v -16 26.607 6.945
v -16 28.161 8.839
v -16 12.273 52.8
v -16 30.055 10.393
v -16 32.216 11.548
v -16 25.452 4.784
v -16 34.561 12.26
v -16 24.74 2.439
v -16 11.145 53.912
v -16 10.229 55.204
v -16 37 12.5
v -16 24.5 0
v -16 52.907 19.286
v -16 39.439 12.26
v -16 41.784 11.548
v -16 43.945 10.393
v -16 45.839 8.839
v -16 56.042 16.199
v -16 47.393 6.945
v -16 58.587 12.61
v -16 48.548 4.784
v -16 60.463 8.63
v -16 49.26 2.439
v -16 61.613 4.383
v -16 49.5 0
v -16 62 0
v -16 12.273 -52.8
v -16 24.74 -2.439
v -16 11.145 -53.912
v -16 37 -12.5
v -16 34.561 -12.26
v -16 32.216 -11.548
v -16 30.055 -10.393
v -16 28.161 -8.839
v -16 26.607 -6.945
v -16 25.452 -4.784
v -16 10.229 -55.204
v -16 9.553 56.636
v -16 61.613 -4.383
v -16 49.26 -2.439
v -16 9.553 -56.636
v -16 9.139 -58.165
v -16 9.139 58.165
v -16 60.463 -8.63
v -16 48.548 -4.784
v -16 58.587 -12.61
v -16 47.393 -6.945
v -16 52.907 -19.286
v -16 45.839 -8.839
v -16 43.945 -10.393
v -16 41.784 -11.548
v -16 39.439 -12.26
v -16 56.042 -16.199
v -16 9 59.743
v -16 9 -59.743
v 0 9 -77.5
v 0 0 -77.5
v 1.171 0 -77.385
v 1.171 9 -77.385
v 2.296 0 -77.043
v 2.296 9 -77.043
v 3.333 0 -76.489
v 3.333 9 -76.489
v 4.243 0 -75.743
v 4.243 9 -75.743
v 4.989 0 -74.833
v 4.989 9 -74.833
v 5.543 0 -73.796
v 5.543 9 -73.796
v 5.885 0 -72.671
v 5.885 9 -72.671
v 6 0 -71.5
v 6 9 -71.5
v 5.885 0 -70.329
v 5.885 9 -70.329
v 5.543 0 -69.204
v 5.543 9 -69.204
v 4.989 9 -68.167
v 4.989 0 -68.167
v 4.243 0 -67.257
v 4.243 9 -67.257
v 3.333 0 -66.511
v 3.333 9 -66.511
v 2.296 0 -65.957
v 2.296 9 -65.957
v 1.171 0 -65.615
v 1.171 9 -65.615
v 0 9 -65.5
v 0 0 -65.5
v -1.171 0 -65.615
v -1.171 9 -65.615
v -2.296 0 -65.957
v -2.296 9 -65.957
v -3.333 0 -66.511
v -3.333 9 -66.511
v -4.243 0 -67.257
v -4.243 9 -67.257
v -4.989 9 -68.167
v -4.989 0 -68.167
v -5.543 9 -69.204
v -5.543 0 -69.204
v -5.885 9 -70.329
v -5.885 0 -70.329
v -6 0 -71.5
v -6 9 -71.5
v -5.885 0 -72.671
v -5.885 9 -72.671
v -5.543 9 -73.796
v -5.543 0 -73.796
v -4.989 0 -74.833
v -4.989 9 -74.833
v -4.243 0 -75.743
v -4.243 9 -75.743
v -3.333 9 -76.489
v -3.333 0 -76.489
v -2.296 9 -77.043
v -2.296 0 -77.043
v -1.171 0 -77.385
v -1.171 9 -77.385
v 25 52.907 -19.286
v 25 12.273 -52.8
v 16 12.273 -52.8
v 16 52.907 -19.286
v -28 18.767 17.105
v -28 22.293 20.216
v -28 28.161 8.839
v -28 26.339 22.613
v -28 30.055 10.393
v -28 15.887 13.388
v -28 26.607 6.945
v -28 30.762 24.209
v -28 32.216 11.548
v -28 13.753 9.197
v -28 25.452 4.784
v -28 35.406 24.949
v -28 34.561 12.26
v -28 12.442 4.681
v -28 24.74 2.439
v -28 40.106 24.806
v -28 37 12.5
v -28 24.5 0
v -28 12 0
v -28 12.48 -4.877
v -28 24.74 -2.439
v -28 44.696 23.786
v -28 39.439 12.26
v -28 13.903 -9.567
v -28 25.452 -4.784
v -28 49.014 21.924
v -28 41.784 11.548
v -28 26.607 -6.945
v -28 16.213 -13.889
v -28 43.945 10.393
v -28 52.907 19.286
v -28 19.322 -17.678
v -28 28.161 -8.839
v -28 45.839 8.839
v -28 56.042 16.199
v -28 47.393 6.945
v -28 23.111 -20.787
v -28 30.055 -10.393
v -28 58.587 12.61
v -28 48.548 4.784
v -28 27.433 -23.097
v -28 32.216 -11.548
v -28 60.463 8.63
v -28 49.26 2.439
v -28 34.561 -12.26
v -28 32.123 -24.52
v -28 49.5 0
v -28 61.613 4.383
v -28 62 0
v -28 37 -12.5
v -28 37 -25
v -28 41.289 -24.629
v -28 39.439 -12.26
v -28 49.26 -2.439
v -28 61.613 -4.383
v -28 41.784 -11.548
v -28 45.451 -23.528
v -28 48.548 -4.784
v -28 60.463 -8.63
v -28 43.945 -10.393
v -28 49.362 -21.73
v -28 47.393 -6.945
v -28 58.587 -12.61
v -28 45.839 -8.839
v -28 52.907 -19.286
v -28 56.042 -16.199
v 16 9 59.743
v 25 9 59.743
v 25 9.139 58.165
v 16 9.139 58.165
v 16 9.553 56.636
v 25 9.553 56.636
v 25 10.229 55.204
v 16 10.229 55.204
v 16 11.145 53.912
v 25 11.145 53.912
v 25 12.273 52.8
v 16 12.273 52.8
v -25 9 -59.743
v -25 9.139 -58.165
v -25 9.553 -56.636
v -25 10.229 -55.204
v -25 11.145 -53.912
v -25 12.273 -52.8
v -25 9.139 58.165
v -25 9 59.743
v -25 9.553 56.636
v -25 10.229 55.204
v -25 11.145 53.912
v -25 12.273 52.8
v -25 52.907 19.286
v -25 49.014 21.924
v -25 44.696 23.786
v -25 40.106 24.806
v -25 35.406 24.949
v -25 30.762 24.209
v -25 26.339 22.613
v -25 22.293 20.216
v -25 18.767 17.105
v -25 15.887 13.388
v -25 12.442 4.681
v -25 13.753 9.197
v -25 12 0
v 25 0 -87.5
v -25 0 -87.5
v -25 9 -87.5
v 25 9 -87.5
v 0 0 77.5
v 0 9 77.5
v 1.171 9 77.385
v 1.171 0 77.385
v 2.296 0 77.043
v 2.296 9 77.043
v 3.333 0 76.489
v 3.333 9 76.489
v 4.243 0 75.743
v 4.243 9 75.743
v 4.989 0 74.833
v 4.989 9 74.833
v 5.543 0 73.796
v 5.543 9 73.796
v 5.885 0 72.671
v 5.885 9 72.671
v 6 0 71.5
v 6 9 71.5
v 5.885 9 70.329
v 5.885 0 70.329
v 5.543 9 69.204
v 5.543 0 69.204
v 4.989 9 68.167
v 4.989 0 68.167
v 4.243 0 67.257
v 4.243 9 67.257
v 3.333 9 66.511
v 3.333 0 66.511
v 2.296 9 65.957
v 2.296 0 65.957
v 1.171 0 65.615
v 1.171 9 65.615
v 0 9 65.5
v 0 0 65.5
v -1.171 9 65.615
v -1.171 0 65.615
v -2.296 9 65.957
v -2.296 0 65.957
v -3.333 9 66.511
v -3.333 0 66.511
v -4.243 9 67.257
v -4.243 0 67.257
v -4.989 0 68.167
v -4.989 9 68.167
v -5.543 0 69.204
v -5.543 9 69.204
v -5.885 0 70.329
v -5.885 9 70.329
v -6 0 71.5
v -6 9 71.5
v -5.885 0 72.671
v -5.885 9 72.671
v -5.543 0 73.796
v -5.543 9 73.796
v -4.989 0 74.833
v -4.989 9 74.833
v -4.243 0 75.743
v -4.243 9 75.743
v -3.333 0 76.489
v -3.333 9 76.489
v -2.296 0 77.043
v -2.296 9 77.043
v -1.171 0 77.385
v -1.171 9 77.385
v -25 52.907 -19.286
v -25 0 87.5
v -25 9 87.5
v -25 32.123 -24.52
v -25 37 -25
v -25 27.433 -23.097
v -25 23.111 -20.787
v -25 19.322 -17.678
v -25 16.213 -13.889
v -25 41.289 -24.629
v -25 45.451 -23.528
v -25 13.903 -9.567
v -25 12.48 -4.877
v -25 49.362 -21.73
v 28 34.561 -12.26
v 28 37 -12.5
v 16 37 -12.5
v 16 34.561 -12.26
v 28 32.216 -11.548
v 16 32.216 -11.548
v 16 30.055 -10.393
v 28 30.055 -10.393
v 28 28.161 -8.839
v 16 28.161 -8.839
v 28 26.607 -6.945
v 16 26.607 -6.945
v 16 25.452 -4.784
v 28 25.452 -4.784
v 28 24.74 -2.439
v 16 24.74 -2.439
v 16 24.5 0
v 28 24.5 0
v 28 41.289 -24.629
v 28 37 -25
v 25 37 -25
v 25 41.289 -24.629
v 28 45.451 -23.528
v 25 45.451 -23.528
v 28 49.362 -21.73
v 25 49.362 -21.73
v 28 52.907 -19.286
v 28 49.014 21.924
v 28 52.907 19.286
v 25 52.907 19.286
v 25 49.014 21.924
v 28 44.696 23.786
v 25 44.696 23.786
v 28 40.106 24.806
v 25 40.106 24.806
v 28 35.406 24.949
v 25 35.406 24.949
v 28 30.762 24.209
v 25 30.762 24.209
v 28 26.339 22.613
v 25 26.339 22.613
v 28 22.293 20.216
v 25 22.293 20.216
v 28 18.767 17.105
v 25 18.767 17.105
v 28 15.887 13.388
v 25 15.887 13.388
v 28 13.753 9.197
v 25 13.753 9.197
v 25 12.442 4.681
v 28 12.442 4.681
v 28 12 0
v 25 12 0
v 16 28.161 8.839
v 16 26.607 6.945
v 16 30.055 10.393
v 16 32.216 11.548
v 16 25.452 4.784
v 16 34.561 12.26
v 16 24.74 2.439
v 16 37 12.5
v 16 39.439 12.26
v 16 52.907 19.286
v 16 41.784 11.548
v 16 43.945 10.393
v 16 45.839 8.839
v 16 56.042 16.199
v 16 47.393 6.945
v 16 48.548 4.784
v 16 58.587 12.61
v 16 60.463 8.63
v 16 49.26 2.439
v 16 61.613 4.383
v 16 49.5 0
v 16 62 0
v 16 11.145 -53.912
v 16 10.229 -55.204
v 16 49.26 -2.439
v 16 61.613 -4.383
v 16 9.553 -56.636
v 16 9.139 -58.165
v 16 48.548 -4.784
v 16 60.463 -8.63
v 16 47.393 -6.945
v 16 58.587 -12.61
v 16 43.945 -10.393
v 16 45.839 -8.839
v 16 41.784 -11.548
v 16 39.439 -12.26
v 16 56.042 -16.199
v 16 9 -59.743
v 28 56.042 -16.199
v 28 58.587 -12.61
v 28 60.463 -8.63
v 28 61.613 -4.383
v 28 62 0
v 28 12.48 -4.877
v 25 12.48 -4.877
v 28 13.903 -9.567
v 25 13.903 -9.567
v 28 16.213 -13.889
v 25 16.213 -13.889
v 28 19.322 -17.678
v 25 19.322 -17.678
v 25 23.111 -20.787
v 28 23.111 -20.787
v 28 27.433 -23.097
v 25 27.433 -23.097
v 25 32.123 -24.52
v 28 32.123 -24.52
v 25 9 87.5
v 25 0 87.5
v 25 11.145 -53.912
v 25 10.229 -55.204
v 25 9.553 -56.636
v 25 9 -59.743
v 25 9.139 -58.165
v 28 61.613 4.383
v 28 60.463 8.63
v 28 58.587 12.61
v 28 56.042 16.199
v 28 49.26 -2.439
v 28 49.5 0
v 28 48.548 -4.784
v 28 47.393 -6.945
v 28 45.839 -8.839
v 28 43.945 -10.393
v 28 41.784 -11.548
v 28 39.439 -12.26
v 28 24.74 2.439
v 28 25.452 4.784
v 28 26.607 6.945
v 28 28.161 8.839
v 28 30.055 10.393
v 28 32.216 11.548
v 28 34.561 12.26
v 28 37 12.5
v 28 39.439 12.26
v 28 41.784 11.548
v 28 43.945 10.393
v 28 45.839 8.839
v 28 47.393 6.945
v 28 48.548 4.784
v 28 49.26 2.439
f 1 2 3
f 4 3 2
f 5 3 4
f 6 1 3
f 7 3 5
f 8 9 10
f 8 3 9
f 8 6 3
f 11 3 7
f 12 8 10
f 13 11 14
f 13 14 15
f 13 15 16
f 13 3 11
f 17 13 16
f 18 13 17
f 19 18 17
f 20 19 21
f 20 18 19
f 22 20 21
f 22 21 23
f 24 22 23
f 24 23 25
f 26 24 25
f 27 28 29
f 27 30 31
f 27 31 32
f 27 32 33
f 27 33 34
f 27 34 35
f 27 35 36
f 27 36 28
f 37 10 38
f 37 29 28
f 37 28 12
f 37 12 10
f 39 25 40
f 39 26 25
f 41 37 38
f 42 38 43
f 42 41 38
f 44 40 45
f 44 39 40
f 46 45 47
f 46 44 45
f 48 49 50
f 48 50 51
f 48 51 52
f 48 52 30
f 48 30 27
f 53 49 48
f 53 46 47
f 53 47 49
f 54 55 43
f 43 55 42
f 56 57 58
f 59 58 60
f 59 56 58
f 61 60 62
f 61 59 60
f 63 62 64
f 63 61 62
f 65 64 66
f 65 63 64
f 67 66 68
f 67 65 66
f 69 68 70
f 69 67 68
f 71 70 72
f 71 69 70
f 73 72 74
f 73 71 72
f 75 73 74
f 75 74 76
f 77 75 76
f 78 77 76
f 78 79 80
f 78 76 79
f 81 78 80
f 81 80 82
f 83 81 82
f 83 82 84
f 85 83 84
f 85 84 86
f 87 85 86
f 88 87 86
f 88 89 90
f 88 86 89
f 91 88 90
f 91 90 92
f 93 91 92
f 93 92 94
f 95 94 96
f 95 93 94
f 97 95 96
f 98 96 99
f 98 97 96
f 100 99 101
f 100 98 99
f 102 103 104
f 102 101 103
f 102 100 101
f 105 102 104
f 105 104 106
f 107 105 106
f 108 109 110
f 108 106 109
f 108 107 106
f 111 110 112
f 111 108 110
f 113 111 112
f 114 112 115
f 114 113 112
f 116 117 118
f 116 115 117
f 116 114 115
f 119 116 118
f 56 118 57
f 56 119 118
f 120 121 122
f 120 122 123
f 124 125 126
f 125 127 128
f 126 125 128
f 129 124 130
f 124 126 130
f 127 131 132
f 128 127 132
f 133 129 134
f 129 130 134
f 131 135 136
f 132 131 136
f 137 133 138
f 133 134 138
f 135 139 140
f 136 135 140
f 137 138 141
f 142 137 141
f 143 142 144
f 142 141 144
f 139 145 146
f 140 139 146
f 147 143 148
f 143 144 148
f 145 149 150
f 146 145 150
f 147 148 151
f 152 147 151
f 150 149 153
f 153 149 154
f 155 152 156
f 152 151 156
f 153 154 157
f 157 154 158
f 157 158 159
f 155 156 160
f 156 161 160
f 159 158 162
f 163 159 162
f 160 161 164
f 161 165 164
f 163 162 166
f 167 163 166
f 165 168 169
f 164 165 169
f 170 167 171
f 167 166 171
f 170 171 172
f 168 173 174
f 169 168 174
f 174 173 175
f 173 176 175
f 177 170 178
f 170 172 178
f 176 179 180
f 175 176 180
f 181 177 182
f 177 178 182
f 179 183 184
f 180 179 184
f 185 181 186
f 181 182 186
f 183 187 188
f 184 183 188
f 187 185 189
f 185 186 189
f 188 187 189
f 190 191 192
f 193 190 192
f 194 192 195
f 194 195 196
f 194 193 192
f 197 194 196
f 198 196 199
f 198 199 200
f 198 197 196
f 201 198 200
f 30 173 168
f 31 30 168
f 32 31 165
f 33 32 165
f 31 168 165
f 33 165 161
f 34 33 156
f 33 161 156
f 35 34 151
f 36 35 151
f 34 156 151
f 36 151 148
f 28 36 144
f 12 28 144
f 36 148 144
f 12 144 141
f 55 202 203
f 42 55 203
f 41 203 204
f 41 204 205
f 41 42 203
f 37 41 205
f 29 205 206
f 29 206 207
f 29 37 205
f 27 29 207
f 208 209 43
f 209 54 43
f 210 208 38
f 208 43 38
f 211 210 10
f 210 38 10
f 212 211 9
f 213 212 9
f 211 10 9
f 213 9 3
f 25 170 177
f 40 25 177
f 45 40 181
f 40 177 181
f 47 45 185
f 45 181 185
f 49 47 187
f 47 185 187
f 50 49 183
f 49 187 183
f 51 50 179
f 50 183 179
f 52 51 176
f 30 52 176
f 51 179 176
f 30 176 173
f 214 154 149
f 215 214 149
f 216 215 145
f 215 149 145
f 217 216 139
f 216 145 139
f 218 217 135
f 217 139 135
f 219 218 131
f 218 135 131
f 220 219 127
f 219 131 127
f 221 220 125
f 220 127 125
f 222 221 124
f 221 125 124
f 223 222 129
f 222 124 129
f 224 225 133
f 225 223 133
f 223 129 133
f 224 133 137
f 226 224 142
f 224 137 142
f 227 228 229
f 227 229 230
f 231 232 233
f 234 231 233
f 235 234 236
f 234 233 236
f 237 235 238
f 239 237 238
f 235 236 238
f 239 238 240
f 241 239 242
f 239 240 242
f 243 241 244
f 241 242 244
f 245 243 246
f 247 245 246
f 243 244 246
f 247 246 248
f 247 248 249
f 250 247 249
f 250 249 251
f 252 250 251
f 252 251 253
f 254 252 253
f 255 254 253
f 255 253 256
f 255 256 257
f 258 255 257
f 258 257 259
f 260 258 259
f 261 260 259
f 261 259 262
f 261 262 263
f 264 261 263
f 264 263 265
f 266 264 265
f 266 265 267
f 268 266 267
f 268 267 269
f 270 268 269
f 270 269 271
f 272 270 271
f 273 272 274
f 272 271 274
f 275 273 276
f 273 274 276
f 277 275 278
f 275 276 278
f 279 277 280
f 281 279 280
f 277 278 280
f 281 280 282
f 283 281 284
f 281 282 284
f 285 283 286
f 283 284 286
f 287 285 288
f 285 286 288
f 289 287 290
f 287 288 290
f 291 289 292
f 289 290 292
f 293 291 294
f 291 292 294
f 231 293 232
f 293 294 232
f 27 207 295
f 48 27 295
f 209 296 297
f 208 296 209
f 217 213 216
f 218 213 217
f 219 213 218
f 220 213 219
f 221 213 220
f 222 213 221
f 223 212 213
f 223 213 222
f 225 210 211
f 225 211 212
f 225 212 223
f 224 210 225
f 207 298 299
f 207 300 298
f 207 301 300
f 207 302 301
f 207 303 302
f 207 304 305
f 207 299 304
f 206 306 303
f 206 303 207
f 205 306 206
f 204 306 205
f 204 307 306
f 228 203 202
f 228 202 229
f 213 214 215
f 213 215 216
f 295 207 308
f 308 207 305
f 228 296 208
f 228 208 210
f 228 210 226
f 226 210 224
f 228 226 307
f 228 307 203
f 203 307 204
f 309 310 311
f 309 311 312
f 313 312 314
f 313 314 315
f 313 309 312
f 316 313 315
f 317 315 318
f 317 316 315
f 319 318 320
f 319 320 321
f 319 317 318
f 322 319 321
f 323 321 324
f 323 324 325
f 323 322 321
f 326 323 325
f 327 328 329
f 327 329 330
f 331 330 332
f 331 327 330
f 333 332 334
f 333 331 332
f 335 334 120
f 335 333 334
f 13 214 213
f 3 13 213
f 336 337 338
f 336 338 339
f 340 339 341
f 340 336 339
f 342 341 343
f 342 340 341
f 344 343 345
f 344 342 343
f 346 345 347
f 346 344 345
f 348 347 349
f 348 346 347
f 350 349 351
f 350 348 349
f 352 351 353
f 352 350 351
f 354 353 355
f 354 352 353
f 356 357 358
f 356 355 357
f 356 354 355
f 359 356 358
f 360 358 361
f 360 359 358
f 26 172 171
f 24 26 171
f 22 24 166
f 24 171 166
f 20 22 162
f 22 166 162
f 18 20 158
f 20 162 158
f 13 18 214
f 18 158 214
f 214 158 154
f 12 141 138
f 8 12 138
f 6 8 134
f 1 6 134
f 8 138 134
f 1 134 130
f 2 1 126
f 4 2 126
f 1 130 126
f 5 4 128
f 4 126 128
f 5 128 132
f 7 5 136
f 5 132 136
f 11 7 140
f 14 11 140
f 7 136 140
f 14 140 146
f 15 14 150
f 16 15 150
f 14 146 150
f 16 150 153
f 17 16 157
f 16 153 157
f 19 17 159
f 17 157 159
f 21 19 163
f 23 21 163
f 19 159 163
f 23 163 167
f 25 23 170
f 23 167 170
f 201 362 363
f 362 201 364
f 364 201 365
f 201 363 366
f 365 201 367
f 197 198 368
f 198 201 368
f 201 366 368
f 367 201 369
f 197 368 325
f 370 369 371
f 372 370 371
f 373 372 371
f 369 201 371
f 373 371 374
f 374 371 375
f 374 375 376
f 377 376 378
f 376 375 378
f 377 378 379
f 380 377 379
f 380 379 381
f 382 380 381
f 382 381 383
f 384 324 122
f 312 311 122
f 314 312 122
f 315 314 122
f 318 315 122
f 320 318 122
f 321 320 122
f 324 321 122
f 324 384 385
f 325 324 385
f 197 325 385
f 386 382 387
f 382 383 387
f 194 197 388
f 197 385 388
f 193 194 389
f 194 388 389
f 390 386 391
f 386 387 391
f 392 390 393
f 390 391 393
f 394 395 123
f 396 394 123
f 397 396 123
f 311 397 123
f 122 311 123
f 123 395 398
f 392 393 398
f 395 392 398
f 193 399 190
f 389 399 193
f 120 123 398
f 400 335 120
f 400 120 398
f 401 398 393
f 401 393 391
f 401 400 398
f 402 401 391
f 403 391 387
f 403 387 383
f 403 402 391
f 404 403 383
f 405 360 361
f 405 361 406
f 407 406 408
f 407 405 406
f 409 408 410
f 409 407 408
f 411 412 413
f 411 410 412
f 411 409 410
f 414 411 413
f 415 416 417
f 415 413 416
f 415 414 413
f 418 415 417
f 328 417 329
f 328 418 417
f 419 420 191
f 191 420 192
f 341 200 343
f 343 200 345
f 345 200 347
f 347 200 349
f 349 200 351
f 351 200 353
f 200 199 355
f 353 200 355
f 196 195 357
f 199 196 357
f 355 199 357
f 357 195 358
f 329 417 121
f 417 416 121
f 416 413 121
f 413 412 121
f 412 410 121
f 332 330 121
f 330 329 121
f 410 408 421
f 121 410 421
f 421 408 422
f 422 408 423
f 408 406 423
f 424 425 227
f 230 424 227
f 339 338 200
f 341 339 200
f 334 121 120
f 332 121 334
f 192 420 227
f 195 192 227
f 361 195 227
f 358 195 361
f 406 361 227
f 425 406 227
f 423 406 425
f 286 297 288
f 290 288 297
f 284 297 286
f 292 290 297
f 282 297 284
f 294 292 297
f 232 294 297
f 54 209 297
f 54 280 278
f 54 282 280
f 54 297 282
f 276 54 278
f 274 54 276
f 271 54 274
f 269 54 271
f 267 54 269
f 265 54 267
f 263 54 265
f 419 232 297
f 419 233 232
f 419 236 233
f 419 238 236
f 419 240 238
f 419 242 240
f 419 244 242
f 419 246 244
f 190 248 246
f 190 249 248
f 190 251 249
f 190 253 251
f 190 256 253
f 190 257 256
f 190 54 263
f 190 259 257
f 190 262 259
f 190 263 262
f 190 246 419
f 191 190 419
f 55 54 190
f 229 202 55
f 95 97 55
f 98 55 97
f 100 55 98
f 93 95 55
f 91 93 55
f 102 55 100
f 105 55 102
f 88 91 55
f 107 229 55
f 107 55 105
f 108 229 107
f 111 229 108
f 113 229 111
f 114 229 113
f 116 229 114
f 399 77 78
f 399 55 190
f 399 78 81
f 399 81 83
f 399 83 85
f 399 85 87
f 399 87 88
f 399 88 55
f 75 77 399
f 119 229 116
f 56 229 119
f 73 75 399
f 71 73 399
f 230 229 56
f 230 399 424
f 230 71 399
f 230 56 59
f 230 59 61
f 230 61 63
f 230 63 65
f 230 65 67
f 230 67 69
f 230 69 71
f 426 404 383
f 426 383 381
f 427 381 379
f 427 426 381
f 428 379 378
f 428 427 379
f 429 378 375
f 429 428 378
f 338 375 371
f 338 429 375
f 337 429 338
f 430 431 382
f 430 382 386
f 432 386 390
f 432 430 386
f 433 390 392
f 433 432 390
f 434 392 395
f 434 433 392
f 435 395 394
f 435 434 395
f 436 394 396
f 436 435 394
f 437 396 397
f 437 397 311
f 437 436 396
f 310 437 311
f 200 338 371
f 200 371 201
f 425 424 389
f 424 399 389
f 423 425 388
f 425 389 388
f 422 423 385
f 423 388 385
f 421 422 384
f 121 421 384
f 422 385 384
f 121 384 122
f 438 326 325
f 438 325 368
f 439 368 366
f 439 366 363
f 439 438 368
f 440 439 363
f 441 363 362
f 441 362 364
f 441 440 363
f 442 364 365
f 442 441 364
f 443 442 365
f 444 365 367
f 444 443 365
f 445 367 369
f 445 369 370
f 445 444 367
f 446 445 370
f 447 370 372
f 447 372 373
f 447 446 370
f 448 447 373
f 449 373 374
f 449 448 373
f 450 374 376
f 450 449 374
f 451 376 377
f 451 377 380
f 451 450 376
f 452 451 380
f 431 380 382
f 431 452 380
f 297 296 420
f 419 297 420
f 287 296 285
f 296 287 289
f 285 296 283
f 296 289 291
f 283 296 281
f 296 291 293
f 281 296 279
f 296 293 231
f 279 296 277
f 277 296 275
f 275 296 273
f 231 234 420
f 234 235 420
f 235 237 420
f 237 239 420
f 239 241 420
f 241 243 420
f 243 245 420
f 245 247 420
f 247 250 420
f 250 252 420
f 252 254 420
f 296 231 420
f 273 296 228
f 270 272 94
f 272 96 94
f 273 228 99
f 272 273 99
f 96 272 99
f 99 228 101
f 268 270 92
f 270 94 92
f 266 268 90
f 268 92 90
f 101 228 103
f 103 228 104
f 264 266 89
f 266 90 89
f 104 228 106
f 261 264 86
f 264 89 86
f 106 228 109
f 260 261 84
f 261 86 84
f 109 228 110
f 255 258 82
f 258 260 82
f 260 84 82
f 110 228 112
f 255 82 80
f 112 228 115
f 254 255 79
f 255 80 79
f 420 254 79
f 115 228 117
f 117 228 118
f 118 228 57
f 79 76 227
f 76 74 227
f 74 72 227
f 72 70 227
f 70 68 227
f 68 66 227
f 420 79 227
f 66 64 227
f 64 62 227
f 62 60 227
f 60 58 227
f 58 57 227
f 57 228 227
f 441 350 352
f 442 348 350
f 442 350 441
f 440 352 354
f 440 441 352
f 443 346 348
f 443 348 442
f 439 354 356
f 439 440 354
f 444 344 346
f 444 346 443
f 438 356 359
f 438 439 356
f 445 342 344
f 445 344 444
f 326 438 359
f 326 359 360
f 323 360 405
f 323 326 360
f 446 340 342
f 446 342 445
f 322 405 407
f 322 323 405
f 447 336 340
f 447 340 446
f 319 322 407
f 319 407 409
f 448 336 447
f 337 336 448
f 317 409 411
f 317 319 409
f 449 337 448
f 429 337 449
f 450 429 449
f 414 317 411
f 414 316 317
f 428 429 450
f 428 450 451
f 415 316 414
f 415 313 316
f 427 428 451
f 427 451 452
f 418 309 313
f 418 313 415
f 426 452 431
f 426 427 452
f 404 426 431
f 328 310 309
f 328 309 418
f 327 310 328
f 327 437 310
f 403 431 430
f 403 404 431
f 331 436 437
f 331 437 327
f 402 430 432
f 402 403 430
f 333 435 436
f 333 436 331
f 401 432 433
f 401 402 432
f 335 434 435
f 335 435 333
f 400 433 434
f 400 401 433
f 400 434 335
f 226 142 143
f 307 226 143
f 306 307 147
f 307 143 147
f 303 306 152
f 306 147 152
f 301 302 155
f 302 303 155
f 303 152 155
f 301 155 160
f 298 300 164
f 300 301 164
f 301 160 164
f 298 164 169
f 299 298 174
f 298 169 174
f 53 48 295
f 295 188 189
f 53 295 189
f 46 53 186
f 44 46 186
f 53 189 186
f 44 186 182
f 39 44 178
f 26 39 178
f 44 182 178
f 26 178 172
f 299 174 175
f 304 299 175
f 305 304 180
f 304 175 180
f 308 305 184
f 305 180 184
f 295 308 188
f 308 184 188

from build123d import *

# Parameters (mm, degrees)
SKETCH1_W            = 50
SKETCH1_H            = 175
BOSS_EXTRUDE1_DEPTH  = 9
SKETCH2_R            = 6
CUT_EXTRUDE1_DEPTH   = 92.445338864
BOSS_EXTRUDE2_DEPTH  = 9
BOSS_EXTRUDE3_START  = 3
SKETCH3_3_R          = 25
SKETCH3_3_R_2        = 12.5
BOSS_EXTRUDE3_DEPTH  = 12
FILLET1_R            = 9
FILLET1_OF_MIRROR4_R = 9


with BuildPart() as part:
    # Sketch1 → Boss-Extrude1 (new body)
    with BuildSketch(Plane(origin=(0, 0, 0), x_dir=(1, 0, 0), z_dir=(0, 1, 0))):
        Rectangle(SKETCH1_W, SKETCH1_H)
    extrude(amount=BOSS_EXTRUDE1_DEPTH)

    # Sketch2 → Cut-Extrude1 (cut, through all)
    with BuildSketch(Plane(origin=(0, 9, 0), x_dir=(1, 0, 0), z_dir=(0, 1, 0))):
        with Locations((0, -71.5)):
            Circle(SKETCH2_R)
    cut_extrude1 = extrude(amount=-CUT_EXTRUDE1_DEPTH, mode=Mode.SUBTRACT)

    # Mirror1: Cut-Extrude1 across plane
    add(cut_extrude1.mirror(Plane.XY), mode=Mode.SUBTRACT)

    # Sketch3 → Boss-Extrude2 (add)
    with BuildSketch(Plane(origin=(25, 0, 0), x_dir=(0, 0, -1), z_dir=(1, 0, 0))):
        with BuildLine():
            Line((-19.286429863, 52.90703062), (-55.5, 9))
            Line((-55.5, 9), (55.5, 9))
            Line((55.5, 9), (19.286429863, 52.90703062))
            ThreePointArc((19.286429863, 52.90703062), (0, 12), (-19.286429863, 52.90703062))
        make_face()
    boss_extrude2 = extrude(amount=-BOSS_EXTRUDE2_DEPTH)

    # Sketch3<3> → Boss-Extrude3 (add)
    with BuildSketch(Plane(origin=(25, 0, 0), x_dir=(0, 0, -1), z_dir=(1, 0, 0)).offset(BOSS_EXTRUDE3_START)):
        with Locations((0, 37)):
            Circle(SKETCH3_3_R)
        with Locations((0, 37)):
            Circle(SKETCH3_3_R_2, mode=Mode.SUBTRACT)
    boss_extrude3 = extrude(amount=-BOSS_EXTRUDE3_DEPTH)

    # Fillet1
    fillet1_edges = [part.edges().sort_by_distance(p)[0] for p in [
        (20.5, 9, -55.5),
        (20.5, 9, 55.5),
    ]]
    fillet(fillet1_edges, radius=FILLET1_R)

    # Mirror4: Boss-Extrude2, Boss-Extrude3 across plane
    add(boss_extrude2.mirror(Plane(origin=(0, 0, 0), x_dir=(0, 0, 1), z_dir=(1, 0, 0))))
    add(boss_extrude3.mirror(Plane(origin=(0, 0, 0), x_dir=(0, 0, 1), z_dir=(1, 0, 0))))

    # Fillet1 of Mirror4
    fillet1_of_mirror4_edges = [part.edges().sort_by_distance(p)[0] for p in [
        (-20.5, 9, -55.5),
        (-20.5, 9, 55.5),
    ]]
    fillet(fillet1_of_mirror4_edges, radius=FILLET1_OF_MIRROR4_R)


solid = part.part
